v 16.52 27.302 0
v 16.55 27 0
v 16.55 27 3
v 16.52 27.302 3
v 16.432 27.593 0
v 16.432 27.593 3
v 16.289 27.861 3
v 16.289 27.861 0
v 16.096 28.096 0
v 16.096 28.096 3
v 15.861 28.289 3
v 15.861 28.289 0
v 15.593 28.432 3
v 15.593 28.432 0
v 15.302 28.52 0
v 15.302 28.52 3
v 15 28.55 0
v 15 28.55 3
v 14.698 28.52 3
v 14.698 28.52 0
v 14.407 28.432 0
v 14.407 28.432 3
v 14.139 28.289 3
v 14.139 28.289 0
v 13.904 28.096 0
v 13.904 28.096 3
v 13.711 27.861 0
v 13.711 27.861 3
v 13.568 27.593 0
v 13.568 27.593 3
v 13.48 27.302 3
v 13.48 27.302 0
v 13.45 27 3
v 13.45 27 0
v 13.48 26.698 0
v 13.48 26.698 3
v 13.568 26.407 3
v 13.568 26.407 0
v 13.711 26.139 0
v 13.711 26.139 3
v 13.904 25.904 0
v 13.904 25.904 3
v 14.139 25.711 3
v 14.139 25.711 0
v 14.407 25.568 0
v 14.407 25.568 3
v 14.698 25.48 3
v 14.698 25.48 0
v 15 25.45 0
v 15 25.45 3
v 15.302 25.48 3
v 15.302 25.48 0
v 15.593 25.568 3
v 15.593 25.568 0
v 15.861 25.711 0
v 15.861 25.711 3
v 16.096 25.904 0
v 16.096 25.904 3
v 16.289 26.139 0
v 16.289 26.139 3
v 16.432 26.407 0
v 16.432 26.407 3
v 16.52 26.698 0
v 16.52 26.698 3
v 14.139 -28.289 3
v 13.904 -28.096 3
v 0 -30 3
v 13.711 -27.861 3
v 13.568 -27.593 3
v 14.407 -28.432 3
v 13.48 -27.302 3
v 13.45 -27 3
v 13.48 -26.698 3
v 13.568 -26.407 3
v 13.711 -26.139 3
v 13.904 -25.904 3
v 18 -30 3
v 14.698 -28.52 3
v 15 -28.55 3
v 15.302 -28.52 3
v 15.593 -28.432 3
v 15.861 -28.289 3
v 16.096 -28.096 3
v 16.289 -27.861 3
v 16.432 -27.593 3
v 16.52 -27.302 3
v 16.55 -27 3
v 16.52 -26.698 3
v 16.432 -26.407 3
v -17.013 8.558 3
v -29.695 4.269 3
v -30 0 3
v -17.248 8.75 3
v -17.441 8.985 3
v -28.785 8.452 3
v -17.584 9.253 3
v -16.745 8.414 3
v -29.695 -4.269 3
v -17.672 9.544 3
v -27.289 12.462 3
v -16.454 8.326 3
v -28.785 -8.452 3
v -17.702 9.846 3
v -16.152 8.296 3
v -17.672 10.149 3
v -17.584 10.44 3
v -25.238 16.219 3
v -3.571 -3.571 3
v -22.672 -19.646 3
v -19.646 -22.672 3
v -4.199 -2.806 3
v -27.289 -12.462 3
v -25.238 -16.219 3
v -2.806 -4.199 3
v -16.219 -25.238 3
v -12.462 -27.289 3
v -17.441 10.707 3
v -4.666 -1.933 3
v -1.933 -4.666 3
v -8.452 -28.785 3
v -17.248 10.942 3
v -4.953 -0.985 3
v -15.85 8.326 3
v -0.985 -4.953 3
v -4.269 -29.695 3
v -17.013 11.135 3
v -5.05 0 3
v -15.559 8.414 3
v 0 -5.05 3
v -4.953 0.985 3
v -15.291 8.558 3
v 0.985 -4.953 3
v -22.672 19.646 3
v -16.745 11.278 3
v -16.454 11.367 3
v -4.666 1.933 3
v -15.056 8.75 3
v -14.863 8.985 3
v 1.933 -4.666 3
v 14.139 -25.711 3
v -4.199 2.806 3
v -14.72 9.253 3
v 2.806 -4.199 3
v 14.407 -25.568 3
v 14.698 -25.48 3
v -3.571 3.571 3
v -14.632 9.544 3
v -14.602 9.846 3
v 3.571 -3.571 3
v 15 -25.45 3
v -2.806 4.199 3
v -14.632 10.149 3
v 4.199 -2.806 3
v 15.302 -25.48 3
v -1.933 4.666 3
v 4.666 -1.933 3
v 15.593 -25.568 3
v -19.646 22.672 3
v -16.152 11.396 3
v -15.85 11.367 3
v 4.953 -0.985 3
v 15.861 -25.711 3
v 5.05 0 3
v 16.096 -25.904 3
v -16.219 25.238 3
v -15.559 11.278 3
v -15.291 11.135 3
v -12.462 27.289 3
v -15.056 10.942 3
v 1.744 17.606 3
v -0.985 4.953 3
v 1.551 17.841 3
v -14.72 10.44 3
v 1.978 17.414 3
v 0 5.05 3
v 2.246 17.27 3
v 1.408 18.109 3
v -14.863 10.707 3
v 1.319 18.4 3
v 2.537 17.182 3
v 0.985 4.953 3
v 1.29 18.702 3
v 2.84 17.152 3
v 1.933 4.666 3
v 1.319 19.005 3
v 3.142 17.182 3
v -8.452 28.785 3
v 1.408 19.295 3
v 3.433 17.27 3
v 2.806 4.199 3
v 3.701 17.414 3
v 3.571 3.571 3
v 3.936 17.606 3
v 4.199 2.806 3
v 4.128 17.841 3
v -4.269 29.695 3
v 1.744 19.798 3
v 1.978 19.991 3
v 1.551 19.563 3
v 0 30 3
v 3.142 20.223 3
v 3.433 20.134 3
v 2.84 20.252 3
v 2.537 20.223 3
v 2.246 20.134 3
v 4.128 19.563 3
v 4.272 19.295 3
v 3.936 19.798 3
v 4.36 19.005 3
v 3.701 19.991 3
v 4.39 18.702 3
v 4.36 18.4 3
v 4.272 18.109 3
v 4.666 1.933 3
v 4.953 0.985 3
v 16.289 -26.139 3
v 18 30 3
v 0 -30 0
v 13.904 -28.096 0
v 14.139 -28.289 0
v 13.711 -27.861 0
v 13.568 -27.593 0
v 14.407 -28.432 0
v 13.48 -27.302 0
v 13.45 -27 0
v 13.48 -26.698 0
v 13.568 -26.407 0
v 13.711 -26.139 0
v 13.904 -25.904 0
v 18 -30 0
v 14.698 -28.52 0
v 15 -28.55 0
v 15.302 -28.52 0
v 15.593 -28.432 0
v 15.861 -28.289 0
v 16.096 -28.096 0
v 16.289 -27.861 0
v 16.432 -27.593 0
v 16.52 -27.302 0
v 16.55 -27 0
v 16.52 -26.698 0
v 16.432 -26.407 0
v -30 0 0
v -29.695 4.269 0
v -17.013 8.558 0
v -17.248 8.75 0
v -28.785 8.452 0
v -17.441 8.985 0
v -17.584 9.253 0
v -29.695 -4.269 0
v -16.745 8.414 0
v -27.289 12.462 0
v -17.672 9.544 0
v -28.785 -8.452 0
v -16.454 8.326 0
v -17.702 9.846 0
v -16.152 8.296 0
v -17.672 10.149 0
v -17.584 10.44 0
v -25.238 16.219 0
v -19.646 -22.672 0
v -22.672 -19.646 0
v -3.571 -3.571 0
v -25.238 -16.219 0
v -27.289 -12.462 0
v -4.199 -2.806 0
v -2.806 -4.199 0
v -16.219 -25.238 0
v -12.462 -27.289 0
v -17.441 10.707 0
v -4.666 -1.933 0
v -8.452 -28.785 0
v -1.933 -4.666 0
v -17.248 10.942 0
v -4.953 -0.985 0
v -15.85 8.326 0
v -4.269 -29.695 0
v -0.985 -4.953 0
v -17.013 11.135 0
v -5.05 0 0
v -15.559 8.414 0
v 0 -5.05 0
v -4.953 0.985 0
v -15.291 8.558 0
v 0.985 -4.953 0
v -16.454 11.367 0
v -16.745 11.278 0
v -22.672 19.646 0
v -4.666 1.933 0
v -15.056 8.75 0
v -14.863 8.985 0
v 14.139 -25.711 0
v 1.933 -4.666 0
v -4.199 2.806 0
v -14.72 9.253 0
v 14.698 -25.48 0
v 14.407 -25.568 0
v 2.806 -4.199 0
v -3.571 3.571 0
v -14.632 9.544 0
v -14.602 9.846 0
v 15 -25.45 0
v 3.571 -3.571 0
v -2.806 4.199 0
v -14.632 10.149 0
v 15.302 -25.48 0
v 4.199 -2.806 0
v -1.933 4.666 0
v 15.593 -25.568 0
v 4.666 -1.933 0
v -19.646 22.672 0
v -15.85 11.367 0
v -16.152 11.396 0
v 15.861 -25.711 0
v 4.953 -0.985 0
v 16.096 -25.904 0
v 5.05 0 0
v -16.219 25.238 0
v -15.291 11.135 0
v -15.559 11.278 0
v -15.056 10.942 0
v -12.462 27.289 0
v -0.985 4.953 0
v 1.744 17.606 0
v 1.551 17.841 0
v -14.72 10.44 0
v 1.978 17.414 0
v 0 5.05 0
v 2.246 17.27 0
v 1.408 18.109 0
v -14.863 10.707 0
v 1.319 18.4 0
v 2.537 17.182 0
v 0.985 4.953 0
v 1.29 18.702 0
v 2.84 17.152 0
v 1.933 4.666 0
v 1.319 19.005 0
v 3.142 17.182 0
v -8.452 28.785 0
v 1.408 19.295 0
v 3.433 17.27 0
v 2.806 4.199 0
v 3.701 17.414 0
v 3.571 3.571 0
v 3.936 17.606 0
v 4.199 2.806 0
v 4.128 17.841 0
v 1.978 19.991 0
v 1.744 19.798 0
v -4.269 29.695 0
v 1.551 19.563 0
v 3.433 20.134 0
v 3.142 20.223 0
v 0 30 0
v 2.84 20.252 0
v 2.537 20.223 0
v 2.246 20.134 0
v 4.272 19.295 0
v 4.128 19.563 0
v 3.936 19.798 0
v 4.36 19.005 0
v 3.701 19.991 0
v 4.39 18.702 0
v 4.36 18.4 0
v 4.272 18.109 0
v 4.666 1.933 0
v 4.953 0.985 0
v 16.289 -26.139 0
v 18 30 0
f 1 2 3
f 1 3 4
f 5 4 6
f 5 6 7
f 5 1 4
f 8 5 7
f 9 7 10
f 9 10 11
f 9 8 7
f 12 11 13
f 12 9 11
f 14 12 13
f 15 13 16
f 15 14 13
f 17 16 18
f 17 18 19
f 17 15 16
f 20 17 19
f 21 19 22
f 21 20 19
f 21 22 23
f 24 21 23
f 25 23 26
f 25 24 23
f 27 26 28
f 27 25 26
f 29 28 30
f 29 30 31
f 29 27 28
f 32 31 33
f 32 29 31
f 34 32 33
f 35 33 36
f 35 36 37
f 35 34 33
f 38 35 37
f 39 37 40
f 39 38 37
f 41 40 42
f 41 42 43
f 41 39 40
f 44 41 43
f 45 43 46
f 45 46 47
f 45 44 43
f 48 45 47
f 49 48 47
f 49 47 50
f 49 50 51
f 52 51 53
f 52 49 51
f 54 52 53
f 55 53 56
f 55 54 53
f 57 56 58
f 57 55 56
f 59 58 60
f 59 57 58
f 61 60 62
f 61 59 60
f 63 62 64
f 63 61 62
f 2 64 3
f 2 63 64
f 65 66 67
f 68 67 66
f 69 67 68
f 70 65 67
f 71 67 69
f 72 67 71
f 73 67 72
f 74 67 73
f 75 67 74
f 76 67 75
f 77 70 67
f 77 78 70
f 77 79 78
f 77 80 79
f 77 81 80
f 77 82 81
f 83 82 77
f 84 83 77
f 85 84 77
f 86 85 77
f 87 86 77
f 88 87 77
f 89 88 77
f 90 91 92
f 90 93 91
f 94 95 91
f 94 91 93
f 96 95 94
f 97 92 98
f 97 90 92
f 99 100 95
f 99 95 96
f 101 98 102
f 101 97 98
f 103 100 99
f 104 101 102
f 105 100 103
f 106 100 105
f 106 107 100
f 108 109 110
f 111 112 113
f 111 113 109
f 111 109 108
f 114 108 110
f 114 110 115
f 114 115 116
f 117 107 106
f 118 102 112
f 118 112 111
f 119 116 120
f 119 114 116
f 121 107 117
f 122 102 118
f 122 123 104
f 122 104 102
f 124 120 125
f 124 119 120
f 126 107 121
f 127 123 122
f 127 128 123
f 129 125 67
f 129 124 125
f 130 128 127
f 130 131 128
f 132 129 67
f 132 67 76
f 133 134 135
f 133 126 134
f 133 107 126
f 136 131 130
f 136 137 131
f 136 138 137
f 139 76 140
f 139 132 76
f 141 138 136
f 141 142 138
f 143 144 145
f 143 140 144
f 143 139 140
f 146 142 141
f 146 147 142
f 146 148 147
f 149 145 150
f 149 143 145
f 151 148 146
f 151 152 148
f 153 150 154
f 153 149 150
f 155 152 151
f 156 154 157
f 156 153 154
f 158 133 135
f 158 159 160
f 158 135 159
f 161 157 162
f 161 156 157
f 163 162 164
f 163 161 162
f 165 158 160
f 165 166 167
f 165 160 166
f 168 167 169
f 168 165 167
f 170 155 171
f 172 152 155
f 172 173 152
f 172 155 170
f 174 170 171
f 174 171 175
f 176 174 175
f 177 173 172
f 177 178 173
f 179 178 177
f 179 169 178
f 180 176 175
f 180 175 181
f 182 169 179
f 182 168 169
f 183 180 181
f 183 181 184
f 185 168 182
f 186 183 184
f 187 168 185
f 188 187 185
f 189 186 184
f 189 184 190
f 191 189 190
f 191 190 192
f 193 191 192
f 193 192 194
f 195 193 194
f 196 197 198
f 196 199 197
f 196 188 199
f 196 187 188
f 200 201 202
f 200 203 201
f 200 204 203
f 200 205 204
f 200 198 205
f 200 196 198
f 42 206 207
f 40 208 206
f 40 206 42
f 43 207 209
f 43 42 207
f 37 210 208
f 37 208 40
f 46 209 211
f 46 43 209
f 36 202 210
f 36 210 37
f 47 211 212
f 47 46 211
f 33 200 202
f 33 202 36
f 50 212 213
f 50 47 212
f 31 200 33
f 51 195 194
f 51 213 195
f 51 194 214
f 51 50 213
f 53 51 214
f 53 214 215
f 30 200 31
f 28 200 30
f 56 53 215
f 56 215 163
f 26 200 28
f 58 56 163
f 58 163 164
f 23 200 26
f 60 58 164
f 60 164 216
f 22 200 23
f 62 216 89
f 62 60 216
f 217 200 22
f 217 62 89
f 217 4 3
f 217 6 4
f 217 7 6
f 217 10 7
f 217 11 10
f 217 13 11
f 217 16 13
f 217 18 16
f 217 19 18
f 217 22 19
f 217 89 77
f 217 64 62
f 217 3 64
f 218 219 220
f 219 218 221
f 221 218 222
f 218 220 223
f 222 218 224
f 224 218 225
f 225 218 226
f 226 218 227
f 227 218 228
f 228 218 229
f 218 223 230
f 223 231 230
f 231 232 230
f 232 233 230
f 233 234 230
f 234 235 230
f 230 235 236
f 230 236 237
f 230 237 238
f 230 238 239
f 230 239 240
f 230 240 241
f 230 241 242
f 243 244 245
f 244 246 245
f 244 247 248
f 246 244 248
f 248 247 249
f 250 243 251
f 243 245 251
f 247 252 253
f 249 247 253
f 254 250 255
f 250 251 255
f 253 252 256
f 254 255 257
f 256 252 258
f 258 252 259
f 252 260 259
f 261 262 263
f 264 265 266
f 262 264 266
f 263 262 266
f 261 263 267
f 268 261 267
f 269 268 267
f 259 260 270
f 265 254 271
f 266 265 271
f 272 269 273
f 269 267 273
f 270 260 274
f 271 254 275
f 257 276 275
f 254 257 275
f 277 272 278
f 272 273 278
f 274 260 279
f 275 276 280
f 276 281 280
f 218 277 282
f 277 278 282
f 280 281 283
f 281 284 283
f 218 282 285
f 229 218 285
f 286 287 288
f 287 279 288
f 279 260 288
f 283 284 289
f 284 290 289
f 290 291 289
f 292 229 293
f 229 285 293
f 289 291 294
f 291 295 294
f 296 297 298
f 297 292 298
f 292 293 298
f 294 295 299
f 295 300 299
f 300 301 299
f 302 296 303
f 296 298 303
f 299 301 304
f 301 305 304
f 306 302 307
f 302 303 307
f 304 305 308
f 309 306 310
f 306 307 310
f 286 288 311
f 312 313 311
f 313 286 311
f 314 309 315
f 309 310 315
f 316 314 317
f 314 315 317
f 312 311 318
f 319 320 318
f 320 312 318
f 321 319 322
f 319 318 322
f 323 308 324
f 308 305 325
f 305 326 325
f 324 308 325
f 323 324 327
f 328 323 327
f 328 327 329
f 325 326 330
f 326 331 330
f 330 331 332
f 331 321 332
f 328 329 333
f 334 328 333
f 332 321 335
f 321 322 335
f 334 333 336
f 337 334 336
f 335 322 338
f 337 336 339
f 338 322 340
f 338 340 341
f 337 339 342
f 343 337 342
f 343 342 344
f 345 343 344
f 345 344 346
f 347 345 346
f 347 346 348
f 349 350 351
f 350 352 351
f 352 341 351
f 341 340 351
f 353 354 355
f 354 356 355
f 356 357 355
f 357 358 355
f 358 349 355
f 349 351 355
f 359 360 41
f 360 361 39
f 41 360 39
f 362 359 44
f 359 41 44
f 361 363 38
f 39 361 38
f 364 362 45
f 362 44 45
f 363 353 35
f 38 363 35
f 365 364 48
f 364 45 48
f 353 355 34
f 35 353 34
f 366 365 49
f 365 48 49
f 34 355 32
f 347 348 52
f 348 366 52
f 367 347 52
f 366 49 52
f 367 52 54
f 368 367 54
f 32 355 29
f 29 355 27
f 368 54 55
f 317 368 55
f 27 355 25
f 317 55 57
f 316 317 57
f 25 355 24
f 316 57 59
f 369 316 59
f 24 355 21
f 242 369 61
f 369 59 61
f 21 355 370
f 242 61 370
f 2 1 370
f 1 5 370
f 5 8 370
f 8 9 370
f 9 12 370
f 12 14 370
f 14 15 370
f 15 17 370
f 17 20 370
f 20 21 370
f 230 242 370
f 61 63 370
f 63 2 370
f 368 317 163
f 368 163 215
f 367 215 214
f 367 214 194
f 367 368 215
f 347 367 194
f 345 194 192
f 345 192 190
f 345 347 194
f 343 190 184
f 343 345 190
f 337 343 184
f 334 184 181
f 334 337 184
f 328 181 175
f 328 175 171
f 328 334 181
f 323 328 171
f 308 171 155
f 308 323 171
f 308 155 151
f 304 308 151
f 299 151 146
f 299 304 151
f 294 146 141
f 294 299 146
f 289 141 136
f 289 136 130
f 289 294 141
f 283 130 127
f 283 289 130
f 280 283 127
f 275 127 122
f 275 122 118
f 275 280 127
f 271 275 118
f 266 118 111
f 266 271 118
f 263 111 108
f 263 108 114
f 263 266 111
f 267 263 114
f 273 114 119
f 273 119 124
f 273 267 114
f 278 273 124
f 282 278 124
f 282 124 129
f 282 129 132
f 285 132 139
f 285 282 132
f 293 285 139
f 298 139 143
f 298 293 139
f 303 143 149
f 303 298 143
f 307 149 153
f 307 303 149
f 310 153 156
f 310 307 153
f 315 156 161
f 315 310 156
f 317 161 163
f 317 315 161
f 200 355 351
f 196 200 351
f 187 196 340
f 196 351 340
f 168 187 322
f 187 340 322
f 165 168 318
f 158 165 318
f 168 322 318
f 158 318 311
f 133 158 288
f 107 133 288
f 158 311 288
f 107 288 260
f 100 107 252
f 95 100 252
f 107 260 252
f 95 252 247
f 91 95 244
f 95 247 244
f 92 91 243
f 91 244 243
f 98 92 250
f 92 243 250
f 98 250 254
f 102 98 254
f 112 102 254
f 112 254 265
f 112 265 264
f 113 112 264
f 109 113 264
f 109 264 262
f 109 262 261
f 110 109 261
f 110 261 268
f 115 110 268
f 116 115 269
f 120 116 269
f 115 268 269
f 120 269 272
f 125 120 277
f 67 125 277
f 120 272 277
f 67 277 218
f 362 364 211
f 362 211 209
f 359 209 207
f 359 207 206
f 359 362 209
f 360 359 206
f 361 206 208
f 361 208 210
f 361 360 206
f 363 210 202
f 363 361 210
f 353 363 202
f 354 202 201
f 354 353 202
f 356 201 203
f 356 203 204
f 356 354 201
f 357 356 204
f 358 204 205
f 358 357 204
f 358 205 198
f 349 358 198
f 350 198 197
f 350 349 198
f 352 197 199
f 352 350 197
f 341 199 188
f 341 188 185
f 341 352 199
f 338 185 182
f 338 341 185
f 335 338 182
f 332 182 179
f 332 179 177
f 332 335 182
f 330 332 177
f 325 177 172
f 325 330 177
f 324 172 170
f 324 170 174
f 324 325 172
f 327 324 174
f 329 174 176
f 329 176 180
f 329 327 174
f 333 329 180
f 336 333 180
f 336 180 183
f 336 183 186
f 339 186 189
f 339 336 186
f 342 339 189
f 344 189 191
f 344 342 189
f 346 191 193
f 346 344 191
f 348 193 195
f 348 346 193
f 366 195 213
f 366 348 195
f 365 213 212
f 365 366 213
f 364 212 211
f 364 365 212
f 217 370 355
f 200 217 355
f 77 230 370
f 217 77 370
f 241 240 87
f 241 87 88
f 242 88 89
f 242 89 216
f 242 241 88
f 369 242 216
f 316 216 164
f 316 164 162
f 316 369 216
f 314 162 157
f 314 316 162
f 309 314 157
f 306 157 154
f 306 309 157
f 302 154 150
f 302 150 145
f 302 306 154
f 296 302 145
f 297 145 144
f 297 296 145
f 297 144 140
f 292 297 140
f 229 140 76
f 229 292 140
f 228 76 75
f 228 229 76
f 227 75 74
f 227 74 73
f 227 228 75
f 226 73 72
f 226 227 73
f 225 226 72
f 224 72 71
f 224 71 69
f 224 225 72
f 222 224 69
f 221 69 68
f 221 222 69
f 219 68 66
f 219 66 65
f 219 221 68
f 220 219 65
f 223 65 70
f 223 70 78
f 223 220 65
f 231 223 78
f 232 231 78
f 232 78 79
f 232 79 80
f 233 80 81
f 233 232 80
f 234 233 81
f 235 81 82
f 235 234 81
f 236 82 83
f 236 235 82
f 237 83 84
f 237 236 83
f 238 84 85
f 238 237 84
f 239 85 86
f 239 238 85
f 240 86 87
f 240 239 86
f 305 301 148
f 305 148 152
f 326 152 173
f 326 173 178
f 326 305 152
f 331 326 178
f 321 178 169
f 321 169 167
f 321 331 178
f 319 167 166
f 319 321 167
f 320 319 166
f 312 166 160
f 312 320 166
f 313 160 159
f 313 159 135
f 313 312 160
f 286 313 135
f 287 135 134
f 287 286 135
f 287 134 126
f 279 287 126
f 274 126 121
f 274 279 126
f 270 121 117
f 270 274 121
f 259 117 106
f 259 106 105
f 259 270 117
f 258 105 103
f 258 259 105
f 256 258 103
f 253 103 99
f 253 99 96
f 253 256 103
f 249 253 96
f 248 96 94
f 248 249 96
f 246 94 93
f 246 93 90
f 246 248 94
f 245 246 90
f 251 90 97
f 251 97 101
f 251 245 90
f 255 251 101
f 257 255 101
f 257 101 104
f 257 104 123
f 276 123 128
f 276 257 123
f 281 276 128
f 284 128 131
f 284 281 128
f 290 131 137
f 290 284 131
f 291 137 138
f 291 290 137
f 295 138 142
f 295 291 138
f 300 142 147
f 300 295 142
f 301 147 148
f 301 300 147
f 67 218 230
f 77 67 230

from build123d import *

# Parameters (mm, degrees)
SKETCH_1_R      = 5.05
SKETCH_1_R_2    = 1.55
EXTRUDE_1_DEPTH = 3


with BuildPart() as part:
    # ｽｹｯﾁ1 → ﾎﾞｽ - 押し出し1 (new body)
    with BuildSketch(Plane.XY):
        with BuildLine():
            Line((0, -30), (18, -30))
            Line((18, -30), (18, 30))
            Line((18, 30), (0, 30))
            ThreePointArc((0, 30), (-30, 0), (0, -30))
        make_face()
        Circle(SKETCH_1_R, mode=Mode.SUBTRACT)
        with Locations((15, 27)):
            Circle(SKETCH_1_R_2, mode=Mode.SUBTRACT)
        with Locations((15, -27)):
            Circle(SKETCH_1_R_2, mode=Mode.SUBTRACT)
        with Locations((-16.152077461, 9.846364808)):
            Circle(SKETCH_1_R_2, mode=Mode.SUBTRACT)
        with Locations((2.839602216, 18.702330483)):
            Circle(SKETCH_1_R_2, mode=Mode.SUBTRACT)
    extrude(amount=EXTRUDE_1_DEPTH)


solid = part.part
